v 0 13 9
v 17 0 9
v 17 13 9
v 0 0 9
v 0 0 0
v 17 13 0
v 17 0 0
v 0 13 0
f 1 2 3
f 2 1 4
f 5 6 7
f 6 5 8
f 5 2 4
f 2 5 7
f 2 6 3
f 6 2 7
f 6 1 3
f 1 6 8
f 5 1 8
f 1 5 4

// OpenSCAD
// Generated by SolidPython 1.0.1 on 2020-07-29 00:46:56


cube(size = [17, 13, 9]);
/***********************************************
*********      SolidPython code:      **********
************************************************
 
# import packages: SolidPython
from solid import *
from solid.utils import *
from itertools import chain, combinations, permutations


class Resize:

    def __init__(self, scad_file):
        self.scad_file = scad_file
        #self.scad_file = import_scad(scad_file)
        # cone/cylinder param:
        self.r1 = 0
        self.r2 = 0
        self.h = 0
        # rectangular prism param:
        self.w = 0
        self.l = 0
        # ellipse param:
        self.r = 0

    # import OpenScad code (file name corresponds to shape)


    # classify shape + parameters
    def assign(self, param1, param2, param3):
        if self.scad_file == 'cone.scad':
            self.r1 = param1
            self.r2 = param2
            self.h = param3
        elif self.scad_file == 'cylinder.scad':
            self.r1 = param1
            self.r2 = param2
            self.h = param3
        elif self.scad_file == 'rectangularPrism.scad':
            self.h = param1
            self.l = param2
            self.w = param3
        else:
            self.r = param1
            self.h = param2

    # resize parameters
    def iterate(self):
        x = range(3, 20, 2)
        i = 1
        if self.scad_file == 'cone.scad':
            tempList = list(permutations(x, 2))
            for temp in tempList:
                param1 = temp[0]
                param2 = temp[1]
                filepath = 'produced_scad_files/' + 'cone' + str(param1) + '_' + str(param2) + '_' + '.scad'
                scad_render_to_file(cylinder(h=param1, r1=param2, r2=0), filepath)

        elif self.scad_file == 'cylinder.scad':
            tempList = list(permutations(x, 3))
            for temp in tempList:
                param1 = temp[0]
                param2 = temp[1]
                filepath = 'produced_scad_files/' + 'cylinder' + str(param1) + '_' + str(param2) + '_' + '.scad'
                scad_render_to_file(cylinder(h=param1, r1=param2, r2=param2), filepath)

        elif self.scad_file == 'rectangularPrism.scad':
            tempList = list(permutations(x, 3))
            for temp in tempList:
                param1 = temp[0]
                param2 = temp[1]
                param3 = temp[2]
                filepath = 'produced_scad_files/' + 'rectangularPrism' + str(param1) + '_' + str(param2) + '_' + str(
                    param3) + '.scad'
                scad_render_to_file(cube(size=(param1, param2, param3)), filepath)

        elif self.scad_file == 'ellipse.scad':
            tempList = list(permutations(x, 4))
            for temp in tempList:
                param1 = temp[0]
                param2 = temp[1]
                param3 = temp[2]
                param4 = temp[3]
                filepath = 'produced_scad_files/' + 'ellipse' + str(param1) + '_' + str(param2) + '_' + str(param3) + '_' + str(param4) + '.scad'
                scad_render_to_file(scale([param1, param2, param3])(sphere(r=param4)), filepath)

    def render_to_scadfile(self):
        scad_render_to_file(scad, 'example.scad') 
 
************************************************/
